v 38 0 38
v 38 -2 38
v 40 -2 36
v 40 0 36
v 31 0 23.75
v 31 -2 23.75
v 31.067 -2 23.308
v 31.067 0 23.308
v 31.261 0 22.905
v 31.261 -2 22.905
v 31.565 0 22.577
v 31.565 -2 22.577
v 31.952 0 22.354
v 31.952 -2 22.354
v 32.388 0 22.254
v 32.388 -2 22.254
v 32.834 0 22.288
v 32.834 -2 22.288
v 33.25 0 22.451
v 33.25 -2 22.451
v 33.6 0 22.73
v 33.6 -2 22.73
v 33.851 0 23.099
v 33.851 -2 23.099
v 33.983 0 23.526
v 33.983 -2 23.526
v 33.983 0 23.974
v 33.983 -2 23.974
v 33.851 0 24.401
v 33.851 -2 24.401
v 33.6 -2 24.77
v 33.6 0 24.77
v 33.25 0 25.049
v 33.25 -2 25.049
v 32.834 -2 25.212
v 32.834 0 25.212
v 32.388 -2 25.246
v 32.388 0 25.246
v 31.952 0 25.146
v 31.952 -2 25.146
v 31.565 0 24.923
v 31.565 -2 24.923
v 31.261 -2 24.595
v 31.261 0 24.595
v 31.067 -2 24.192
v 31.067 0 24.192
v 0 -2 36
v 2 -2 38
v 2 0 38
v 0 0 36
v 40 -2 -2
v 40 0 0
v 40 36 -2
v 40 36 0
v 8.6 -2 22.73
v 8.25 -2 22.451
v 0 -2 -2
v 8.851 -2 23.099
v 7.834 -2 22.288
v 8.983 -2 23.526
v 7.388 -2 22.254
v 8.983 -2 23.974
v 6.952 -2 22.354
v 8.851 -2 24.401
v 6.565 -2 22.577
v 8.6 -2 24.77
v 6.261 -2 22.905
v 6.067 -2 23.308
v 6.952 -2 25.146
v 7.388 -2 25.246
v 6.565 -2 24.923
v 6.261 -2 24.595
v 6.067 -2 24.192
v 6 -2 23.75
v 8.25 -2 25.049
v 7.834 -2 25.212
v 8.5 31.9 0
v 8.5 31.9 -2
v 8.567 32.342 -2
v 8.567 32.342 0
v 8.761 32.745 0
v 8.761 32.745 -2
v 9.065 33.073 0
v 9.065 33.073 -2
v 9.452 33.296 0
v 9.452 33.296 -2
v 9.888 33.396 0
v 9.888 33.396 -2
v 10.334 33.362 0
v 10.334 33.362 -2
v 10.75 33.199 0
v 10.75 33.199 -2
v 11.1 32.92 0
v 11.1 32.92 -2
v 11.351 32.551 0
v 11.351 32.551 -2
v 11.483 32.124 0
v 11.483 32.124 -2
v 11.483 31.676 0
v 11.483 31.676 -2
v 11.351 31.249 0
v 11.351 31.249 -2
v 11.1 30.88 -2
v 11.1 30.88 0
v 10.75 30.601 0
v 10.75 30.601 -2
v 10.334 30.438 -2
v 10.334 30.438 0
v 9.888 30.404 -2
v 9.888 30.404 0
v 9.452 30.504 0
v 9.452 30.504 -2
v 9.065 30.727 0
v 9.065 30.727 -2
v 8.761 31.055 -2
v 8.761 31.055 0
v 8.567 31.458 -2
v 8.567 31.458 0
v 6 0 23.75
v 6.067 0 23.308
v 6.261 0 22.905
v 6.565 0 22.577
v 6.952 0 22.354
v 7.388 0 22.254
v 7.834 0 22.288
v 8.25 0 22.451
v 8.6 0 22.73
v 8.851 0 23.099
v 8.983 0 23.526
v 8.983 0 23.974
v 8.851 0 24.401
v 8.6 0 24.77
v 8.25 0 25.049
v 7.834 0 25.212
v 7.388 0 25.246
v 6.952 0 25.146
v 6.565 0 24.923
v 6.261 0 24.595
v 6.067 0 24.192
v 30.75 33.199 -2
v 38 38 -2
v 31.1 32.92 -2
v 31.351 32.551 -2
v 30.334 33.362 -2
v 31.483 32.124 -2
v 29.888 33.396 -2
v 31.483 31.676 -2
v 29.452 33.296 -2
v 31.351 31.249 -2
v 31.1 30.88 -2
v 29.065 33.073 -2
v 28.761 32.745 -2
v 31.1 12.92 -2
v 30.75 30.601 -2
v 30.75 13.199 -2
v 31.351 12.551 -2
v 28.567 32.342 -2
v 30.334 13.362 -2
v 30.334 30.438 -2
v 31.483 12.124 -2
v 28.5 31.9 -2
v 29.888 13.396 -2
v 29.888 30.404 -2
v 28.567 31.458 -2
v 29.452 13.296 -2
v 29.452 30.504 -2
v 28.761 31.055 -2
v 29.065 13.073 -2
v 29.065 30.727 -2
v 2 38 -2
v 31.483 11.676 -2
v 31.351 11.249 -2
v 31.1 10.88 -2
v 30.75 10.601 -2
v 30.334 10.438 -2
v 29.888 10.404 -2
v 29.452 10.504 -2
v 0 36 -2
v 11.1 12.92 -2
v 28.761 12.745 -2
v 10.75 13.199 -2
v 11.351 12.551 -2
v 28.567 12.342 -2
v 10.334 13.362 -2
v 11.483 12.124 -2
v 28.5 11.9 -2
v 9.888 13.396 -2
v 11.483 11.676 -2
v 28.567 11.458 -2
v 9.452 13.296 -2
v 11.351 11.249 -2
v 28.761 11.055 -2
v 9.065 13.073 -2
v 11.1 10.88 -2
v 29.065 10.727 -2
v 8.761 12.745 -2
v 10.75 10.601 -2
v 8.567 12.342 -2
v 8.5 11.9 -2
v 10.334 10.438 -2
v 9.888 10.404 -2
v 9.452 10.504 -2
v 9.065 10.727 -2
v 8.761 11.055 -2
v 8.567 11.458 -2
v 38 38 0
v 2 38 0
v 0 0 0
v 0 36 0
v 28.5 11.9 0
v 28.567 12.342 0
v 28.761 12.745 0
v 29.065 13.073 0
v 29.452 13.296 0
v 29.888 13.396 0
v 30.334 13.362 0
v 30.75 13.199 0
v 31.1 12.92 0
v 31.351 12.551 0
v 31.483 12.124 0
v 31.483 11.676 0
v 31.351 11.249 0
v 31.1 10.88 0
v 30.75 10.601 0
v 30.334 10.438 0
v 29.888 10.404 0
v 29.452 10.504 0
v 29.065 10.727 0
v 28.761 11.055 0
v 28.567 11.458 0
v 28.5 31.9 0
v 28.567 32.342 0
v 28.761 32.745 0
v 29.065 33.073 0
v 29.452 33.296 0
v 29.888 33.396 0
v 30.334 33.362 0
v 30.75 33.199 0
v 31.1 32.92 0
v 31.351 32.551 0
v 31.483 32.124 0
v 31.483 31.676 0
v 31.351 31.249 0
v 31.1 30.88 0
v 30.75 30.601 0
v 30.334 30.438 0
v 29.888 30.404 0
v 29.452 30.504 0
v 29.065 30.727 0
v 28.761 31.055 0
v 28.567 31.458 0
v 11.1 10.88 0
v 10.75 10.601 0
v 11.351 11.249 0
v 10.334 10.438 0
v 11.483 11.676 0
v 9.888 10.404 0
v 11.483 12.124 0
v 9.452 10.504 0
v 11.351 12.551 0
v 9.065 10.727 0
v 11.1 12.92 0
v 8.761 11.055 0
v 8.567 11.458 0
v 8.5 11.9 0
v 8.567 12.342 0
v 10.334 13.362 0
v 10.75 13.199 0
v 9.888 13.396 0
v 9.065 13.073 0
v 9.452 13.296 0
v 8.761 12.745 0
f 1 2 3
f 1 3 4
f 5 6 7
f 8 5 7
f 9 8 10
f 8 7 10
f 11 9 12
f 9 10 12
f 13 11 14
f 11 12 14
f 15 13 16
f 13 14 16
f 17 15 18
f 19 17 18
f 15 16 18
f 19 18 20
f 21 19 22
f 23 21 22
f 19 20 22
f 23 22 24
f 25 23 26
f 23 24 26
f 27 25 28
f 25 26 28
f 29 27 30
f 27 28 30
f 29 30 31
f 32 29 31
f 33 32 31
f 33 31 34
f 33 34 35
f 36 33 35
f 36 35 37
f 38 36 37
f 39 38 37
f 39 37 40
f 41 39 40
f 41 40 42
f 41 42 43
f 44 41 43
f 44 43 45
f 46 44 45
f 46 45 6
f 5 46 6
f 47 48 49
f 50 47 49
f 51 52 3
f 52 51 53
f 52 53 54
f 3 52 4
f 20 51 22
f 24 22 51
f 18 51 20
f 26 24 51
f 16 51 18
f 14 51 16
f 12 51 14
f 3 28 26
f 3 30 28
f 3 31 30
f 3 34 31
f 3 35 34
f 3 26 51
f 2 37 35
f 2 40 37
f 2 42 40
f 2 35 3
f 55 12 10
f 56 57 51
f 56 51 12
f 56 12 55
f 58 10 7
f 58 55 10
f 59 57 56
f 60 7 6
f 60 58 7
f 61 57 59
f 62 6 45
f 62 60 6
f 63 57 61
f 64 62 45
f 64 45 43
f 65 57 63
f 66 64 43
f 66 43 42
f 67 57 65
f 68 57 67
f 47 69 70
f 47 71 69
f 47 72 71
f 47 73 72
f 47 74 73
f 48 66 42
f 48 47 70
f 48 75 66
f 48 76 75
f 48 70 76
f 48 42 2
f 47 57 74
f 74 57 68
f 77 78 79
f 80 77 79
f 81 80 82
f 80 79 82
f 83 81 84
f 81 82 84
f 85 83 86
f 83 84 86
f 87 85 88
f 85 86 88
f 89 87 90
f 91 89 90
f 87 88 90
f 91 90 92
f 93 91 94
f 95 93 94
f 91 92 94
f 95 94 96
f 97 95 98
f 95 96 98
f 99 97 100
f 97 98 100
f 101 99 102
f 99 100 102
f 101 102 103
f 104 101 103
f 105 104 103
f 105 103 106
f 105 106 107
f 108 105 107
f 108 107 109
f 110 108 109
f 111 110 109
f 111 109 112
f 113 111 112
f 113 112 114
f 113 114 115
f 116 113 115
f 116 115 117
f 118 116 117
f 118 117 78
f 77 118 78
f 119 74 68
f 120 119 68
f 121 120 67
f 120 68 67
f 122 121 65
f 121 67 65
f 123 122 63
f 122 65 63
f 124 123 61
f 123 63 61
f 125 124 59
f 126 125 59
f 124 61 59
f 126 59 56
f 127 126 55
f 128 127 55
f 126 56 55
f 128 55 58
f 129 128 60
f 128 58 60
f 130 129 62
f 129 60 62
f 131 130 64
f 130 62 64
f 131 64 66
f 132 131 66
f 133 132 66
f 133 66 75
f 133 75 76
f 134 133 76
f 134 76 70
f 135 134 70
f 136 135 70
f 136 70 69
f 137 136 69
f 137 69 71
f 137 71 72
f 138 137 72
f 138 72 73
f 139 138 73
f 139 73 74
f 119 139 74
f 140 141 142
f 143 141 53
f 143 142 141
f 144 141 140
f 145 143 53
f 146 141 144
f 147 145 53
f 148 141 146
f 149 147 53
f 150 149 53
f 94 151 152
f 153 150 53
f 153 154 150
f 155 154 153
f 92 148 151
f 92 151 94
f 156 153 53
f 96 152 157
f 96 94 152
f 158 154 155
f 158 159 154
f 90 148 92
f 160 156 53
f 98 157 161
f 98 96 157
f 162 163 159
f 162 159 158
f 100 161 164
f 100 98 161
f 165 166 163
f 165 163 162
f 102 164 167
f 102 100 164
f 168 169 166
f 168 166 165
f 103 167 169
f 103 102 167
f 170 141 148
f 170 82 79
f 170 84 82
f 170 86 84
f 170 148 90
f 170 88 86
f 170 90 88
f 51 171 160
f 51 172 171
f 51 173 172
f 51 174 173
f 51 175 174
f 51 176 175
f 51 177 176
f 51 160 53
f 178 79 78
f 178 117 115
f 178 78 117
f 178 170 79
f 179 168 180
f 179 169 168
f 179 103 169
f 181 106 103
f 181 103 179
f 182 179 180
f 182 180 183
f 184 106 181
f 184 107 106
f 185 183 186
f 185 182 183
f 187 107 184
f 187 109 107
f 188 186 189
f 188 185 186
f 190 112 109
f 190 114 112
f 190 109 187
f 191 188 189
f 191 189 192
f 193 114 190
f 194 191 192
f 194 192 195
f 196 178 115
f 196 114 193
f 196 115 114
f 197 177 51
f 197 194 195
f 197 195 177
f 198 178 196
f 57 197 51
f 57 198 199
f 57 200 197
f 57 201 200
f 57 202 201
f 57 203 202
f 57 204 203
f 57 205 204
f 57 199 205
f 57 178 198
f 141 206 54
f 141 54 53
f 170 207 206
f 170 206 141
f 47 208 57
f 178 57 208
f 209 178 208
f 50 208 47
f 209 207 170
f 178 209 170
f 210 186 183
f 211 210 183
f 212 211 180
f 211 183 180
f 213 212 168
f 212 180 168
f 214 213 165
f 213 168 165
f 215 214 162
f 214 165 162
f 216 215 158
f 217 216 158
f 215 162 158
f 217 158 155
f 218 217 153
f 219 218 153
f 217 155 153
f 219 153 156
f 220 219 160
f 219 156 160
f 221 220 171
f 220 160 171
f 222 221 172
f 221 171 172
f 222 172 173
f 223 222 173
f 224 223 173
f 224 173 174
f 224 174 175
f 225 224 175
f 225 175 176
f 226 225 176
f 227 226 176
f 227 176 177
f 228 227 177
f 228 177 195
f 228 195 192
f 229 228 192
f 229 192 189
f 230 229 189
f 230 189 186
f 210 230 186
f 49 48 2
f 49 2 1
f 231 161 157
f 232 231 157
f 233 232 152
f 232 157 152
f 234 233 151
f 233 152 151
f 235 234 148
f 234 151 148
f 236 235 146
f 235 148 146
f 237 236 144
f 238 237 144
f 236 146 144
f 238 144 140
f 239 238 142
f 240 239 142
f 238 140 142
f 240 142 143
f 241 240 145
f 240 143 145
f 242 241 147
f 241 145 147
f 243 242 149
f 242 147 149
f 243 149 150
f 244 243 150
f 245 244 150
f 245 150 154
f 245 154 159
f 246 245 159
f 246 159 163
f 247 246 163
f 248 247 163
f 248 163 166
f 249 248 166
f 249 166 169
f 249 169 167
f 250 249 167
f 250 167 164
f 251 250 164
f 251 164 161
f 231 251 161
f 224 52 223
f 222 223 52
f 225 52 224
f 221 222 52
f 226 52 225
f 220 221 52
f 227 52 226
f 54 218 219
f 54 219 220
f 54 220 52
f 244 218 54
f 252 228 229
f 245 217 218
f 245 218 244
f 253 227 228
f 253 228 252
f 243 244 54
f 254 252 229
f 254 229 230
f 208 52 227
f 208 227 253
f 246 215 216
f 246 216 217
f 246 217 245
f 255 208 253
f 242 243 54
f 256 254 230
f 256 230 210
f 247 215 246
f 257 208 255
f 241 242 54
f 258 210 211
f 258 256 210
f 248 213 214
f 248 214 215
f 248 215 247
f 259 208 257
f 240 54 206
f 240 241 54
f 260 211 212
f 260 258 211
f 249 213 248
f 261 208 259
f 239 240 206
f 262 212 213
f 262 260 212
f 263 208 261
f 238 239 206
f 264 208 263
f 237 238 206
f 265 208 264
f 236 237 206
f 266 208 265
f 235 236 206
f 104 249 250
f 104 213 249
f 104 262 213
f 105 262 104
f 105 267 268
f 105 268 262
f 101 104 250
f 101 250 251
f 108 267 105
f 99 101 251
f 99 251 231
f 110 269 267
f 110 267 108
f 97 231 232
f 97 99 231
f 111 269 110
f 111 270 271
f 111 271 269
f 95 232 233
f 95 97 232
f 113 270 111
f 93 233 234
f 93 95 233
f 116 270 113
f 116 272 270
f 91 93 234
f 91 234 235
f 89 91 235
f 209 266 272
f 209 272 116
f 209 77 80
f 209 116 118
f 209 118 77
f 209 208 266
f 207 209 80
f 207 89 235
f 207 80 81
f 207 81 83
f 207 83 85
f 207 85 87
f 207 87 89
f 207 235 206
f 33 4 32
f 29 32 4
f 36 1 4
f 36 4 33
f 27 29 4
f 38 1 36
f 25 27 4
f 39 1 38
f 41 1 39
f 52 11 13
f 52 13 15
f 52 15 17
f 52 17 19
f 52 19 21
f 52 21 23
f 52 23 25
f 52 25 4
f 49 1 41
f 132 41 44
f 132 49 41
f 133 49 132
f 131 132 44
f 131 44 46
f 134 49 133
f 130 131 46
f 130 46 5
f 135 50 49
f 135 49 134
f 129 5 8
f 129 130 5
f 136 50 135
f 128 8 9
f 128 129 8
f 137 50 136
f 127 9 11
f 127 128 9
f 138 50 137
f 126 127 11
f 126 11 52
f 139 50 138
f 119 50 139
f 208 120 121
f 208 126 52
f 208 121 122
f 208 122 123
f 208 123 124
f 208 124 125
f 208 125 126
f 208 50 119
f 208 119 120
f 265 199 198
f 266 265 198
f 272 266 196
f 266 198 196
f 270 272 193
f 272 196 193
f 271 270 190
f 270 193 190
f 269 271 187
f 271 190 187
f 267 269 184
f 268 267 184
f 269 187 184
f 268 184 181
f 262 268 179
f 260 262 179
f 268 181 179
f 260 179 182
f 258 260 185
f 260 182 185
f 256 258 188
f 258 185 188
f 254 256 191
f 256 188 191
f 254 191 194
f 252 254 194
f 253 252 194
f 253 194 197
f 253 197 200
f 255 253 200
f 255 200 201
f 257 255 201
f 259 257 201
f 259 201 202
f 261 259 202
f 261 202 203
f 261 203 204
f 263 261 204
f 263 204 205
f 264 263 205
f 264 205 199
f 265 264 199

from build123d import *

# Parameters (mm, degrees)
EXTRUDE1_DEPTH = 40
EXTRUDE2_REACH = 42
SKETCH2_R      = 1.5
EXTRUDE3_REACH = 42
SKETCH3_R      = 1.5
CHAMFER1_SIZE  = 2


with BuildPart() as part:
    # Sketch1 → Extrude1 (new body)
    with BuildSketch(Plane(origin=(0, 0, 0), x_dir=(0, 0, -1), z_dir=(1, 0, 0))):
        Polygon((0, 0), (0, 38), (2, 38), (2, -2), (-38, -2), (-38, 0), align=None)
    extrude(amount=EXTRUDE1_DEPTH)

    # Sketch2 → Extrude2 (cut, up to next)
    with BuildSketch(Plane(origin=(0, -2, 0), x_dir=(-1, 0, 0), z_dir=(0, -1, 0)), mode=Mode.PRIVATE) as extrude2_sk1:
        with Locations((-32.5, -23.75)):
            Circle(SKETCH2_R)
    extrude2_tool1 = extrude(extrude2_sk1.sketch, amount=-EXTRUDE2_REACH, mode=Mode.PRIVATE) & part.part
    add(extrude2_tool1.solids().sort_by_distance((32.5, -2, 23.75))[0], mode=Mode.SUBTRACT)
    # Sketch2 → Extrude2 (cut, up to next)
    with BuildSketch(Plane(origin=(0, -2, 0), x_dir=(-1, 0, 0), z_dir=(0, -1, 0)), mode=Mode.PRIVATE) as extrude2_sk2:
        with Locations((-7.5, -23.75)):
            Circle(SKETCH2_R)
    extrude2_tool2 = extrude(extrude2_sk2.sketch, amount=-EXTRUDE2_REACH, mode=Mode.PRIVATE) & part.part
    add(extrude2_tool2.solids().sort_by_distance((7.5, -2, 23.75))[0], mode=Mode.SUBTRACT)

    # Sketch3 → Extrude3 (cut, up to next)
    with BuildSketch(Plane(origin=(0, 0, -2), x_dir=(-1, 0, 0), z_dir=(0, 0, -1)), mode=Mode.PRIVATE) as extrude3_sk1:
        with Locations((-10, 31.9)):
            Circle(SKETCH3_R)
    extrude3_tool1 = extrude(extrude3_sk1.sketch, amount=-EXTRUDE3_REACH, mode=Mode.PRIVATE) & part.part
    add(extrude3_tool1.solids().sort_by_distance((10, 31.9, -2))[0], mode=Mode.SUBTRACT)
    # Sketch3 → Extrude3 (cut, up to next)
    with BuildSketch(Plane(origin=(0, 0, -2), x_dir=(-1, 0, 0), z_dir=(0, 0, -1)), mode=Mode.PRIVATE) as extrude3_sk2:
        with Locations((-30, 31.9)):
            Circle(SKETCH3_R)
    extrude3_tool2 = extrude(extrude3_sk2.sketch, amount=-EXTRUDE3_REACH, mode=Mode.PRIVATE) & part.part
    add(extrude3_tool2.solids().sort_by_distance((30, 31.9, -2))[0], mode=Mode.SUBTRACT)
    # Sketch3 → Extrude3 (cut, up to next)
    with BuildSketch(Plane(origin=(0, 0, -2), x_dir=(-1, 0, 0), z_dir=(0, 0, -1)), mode=Mode.PRIVATE) as extrude3_sk3:
        with Locations((-30, 11.9)):
            Circle(SKETCH3_R)
    extrude3_tool3 = extrude(extrude3_sk3.sketch, amount=-EXTRUDE3_REACH, mode=Mode.PRIVATE) & part.part
    add(extrude3_tool3.solids().sort_by_distance((30, 11.9, -2))[0], mode=Mode.SUBTRACT)
    # Sketch3 → Extrude3 (cut, up to next)
    with BuildSketch(Plane(origin=(0, 0, -2), x_dir=(-1, 0, 0), z_dir=(0, 0, -1)), mode=Mode.PRIVATE) as extrude3_sk4:
        with Locations((-10, 11.9)):
            Circle(SKETCH3_R)
    extrude3_tool4 = extrude(extrude3_sk4.sketch, amount=-EXTRUDE3_REACH, mode=Mode.PRIVATE) & part.part
    add(extrude3_tool4.solids().sort_by_distance((10, 11.9, -2))[0], mode=Mode.SUBTRACT)

    # Chamfer1
    chamfer1_edges = [part.edges().sort_by_distance(p)[0] for p in [
        (40, 38, -1),
        (0, 38, -1),
        (40, -1, 38),
        (0, -1, 38),
    ]]
    chamfer(chamfer1_edges, length=CHAMFER1_SIZE)


solid = part.part
